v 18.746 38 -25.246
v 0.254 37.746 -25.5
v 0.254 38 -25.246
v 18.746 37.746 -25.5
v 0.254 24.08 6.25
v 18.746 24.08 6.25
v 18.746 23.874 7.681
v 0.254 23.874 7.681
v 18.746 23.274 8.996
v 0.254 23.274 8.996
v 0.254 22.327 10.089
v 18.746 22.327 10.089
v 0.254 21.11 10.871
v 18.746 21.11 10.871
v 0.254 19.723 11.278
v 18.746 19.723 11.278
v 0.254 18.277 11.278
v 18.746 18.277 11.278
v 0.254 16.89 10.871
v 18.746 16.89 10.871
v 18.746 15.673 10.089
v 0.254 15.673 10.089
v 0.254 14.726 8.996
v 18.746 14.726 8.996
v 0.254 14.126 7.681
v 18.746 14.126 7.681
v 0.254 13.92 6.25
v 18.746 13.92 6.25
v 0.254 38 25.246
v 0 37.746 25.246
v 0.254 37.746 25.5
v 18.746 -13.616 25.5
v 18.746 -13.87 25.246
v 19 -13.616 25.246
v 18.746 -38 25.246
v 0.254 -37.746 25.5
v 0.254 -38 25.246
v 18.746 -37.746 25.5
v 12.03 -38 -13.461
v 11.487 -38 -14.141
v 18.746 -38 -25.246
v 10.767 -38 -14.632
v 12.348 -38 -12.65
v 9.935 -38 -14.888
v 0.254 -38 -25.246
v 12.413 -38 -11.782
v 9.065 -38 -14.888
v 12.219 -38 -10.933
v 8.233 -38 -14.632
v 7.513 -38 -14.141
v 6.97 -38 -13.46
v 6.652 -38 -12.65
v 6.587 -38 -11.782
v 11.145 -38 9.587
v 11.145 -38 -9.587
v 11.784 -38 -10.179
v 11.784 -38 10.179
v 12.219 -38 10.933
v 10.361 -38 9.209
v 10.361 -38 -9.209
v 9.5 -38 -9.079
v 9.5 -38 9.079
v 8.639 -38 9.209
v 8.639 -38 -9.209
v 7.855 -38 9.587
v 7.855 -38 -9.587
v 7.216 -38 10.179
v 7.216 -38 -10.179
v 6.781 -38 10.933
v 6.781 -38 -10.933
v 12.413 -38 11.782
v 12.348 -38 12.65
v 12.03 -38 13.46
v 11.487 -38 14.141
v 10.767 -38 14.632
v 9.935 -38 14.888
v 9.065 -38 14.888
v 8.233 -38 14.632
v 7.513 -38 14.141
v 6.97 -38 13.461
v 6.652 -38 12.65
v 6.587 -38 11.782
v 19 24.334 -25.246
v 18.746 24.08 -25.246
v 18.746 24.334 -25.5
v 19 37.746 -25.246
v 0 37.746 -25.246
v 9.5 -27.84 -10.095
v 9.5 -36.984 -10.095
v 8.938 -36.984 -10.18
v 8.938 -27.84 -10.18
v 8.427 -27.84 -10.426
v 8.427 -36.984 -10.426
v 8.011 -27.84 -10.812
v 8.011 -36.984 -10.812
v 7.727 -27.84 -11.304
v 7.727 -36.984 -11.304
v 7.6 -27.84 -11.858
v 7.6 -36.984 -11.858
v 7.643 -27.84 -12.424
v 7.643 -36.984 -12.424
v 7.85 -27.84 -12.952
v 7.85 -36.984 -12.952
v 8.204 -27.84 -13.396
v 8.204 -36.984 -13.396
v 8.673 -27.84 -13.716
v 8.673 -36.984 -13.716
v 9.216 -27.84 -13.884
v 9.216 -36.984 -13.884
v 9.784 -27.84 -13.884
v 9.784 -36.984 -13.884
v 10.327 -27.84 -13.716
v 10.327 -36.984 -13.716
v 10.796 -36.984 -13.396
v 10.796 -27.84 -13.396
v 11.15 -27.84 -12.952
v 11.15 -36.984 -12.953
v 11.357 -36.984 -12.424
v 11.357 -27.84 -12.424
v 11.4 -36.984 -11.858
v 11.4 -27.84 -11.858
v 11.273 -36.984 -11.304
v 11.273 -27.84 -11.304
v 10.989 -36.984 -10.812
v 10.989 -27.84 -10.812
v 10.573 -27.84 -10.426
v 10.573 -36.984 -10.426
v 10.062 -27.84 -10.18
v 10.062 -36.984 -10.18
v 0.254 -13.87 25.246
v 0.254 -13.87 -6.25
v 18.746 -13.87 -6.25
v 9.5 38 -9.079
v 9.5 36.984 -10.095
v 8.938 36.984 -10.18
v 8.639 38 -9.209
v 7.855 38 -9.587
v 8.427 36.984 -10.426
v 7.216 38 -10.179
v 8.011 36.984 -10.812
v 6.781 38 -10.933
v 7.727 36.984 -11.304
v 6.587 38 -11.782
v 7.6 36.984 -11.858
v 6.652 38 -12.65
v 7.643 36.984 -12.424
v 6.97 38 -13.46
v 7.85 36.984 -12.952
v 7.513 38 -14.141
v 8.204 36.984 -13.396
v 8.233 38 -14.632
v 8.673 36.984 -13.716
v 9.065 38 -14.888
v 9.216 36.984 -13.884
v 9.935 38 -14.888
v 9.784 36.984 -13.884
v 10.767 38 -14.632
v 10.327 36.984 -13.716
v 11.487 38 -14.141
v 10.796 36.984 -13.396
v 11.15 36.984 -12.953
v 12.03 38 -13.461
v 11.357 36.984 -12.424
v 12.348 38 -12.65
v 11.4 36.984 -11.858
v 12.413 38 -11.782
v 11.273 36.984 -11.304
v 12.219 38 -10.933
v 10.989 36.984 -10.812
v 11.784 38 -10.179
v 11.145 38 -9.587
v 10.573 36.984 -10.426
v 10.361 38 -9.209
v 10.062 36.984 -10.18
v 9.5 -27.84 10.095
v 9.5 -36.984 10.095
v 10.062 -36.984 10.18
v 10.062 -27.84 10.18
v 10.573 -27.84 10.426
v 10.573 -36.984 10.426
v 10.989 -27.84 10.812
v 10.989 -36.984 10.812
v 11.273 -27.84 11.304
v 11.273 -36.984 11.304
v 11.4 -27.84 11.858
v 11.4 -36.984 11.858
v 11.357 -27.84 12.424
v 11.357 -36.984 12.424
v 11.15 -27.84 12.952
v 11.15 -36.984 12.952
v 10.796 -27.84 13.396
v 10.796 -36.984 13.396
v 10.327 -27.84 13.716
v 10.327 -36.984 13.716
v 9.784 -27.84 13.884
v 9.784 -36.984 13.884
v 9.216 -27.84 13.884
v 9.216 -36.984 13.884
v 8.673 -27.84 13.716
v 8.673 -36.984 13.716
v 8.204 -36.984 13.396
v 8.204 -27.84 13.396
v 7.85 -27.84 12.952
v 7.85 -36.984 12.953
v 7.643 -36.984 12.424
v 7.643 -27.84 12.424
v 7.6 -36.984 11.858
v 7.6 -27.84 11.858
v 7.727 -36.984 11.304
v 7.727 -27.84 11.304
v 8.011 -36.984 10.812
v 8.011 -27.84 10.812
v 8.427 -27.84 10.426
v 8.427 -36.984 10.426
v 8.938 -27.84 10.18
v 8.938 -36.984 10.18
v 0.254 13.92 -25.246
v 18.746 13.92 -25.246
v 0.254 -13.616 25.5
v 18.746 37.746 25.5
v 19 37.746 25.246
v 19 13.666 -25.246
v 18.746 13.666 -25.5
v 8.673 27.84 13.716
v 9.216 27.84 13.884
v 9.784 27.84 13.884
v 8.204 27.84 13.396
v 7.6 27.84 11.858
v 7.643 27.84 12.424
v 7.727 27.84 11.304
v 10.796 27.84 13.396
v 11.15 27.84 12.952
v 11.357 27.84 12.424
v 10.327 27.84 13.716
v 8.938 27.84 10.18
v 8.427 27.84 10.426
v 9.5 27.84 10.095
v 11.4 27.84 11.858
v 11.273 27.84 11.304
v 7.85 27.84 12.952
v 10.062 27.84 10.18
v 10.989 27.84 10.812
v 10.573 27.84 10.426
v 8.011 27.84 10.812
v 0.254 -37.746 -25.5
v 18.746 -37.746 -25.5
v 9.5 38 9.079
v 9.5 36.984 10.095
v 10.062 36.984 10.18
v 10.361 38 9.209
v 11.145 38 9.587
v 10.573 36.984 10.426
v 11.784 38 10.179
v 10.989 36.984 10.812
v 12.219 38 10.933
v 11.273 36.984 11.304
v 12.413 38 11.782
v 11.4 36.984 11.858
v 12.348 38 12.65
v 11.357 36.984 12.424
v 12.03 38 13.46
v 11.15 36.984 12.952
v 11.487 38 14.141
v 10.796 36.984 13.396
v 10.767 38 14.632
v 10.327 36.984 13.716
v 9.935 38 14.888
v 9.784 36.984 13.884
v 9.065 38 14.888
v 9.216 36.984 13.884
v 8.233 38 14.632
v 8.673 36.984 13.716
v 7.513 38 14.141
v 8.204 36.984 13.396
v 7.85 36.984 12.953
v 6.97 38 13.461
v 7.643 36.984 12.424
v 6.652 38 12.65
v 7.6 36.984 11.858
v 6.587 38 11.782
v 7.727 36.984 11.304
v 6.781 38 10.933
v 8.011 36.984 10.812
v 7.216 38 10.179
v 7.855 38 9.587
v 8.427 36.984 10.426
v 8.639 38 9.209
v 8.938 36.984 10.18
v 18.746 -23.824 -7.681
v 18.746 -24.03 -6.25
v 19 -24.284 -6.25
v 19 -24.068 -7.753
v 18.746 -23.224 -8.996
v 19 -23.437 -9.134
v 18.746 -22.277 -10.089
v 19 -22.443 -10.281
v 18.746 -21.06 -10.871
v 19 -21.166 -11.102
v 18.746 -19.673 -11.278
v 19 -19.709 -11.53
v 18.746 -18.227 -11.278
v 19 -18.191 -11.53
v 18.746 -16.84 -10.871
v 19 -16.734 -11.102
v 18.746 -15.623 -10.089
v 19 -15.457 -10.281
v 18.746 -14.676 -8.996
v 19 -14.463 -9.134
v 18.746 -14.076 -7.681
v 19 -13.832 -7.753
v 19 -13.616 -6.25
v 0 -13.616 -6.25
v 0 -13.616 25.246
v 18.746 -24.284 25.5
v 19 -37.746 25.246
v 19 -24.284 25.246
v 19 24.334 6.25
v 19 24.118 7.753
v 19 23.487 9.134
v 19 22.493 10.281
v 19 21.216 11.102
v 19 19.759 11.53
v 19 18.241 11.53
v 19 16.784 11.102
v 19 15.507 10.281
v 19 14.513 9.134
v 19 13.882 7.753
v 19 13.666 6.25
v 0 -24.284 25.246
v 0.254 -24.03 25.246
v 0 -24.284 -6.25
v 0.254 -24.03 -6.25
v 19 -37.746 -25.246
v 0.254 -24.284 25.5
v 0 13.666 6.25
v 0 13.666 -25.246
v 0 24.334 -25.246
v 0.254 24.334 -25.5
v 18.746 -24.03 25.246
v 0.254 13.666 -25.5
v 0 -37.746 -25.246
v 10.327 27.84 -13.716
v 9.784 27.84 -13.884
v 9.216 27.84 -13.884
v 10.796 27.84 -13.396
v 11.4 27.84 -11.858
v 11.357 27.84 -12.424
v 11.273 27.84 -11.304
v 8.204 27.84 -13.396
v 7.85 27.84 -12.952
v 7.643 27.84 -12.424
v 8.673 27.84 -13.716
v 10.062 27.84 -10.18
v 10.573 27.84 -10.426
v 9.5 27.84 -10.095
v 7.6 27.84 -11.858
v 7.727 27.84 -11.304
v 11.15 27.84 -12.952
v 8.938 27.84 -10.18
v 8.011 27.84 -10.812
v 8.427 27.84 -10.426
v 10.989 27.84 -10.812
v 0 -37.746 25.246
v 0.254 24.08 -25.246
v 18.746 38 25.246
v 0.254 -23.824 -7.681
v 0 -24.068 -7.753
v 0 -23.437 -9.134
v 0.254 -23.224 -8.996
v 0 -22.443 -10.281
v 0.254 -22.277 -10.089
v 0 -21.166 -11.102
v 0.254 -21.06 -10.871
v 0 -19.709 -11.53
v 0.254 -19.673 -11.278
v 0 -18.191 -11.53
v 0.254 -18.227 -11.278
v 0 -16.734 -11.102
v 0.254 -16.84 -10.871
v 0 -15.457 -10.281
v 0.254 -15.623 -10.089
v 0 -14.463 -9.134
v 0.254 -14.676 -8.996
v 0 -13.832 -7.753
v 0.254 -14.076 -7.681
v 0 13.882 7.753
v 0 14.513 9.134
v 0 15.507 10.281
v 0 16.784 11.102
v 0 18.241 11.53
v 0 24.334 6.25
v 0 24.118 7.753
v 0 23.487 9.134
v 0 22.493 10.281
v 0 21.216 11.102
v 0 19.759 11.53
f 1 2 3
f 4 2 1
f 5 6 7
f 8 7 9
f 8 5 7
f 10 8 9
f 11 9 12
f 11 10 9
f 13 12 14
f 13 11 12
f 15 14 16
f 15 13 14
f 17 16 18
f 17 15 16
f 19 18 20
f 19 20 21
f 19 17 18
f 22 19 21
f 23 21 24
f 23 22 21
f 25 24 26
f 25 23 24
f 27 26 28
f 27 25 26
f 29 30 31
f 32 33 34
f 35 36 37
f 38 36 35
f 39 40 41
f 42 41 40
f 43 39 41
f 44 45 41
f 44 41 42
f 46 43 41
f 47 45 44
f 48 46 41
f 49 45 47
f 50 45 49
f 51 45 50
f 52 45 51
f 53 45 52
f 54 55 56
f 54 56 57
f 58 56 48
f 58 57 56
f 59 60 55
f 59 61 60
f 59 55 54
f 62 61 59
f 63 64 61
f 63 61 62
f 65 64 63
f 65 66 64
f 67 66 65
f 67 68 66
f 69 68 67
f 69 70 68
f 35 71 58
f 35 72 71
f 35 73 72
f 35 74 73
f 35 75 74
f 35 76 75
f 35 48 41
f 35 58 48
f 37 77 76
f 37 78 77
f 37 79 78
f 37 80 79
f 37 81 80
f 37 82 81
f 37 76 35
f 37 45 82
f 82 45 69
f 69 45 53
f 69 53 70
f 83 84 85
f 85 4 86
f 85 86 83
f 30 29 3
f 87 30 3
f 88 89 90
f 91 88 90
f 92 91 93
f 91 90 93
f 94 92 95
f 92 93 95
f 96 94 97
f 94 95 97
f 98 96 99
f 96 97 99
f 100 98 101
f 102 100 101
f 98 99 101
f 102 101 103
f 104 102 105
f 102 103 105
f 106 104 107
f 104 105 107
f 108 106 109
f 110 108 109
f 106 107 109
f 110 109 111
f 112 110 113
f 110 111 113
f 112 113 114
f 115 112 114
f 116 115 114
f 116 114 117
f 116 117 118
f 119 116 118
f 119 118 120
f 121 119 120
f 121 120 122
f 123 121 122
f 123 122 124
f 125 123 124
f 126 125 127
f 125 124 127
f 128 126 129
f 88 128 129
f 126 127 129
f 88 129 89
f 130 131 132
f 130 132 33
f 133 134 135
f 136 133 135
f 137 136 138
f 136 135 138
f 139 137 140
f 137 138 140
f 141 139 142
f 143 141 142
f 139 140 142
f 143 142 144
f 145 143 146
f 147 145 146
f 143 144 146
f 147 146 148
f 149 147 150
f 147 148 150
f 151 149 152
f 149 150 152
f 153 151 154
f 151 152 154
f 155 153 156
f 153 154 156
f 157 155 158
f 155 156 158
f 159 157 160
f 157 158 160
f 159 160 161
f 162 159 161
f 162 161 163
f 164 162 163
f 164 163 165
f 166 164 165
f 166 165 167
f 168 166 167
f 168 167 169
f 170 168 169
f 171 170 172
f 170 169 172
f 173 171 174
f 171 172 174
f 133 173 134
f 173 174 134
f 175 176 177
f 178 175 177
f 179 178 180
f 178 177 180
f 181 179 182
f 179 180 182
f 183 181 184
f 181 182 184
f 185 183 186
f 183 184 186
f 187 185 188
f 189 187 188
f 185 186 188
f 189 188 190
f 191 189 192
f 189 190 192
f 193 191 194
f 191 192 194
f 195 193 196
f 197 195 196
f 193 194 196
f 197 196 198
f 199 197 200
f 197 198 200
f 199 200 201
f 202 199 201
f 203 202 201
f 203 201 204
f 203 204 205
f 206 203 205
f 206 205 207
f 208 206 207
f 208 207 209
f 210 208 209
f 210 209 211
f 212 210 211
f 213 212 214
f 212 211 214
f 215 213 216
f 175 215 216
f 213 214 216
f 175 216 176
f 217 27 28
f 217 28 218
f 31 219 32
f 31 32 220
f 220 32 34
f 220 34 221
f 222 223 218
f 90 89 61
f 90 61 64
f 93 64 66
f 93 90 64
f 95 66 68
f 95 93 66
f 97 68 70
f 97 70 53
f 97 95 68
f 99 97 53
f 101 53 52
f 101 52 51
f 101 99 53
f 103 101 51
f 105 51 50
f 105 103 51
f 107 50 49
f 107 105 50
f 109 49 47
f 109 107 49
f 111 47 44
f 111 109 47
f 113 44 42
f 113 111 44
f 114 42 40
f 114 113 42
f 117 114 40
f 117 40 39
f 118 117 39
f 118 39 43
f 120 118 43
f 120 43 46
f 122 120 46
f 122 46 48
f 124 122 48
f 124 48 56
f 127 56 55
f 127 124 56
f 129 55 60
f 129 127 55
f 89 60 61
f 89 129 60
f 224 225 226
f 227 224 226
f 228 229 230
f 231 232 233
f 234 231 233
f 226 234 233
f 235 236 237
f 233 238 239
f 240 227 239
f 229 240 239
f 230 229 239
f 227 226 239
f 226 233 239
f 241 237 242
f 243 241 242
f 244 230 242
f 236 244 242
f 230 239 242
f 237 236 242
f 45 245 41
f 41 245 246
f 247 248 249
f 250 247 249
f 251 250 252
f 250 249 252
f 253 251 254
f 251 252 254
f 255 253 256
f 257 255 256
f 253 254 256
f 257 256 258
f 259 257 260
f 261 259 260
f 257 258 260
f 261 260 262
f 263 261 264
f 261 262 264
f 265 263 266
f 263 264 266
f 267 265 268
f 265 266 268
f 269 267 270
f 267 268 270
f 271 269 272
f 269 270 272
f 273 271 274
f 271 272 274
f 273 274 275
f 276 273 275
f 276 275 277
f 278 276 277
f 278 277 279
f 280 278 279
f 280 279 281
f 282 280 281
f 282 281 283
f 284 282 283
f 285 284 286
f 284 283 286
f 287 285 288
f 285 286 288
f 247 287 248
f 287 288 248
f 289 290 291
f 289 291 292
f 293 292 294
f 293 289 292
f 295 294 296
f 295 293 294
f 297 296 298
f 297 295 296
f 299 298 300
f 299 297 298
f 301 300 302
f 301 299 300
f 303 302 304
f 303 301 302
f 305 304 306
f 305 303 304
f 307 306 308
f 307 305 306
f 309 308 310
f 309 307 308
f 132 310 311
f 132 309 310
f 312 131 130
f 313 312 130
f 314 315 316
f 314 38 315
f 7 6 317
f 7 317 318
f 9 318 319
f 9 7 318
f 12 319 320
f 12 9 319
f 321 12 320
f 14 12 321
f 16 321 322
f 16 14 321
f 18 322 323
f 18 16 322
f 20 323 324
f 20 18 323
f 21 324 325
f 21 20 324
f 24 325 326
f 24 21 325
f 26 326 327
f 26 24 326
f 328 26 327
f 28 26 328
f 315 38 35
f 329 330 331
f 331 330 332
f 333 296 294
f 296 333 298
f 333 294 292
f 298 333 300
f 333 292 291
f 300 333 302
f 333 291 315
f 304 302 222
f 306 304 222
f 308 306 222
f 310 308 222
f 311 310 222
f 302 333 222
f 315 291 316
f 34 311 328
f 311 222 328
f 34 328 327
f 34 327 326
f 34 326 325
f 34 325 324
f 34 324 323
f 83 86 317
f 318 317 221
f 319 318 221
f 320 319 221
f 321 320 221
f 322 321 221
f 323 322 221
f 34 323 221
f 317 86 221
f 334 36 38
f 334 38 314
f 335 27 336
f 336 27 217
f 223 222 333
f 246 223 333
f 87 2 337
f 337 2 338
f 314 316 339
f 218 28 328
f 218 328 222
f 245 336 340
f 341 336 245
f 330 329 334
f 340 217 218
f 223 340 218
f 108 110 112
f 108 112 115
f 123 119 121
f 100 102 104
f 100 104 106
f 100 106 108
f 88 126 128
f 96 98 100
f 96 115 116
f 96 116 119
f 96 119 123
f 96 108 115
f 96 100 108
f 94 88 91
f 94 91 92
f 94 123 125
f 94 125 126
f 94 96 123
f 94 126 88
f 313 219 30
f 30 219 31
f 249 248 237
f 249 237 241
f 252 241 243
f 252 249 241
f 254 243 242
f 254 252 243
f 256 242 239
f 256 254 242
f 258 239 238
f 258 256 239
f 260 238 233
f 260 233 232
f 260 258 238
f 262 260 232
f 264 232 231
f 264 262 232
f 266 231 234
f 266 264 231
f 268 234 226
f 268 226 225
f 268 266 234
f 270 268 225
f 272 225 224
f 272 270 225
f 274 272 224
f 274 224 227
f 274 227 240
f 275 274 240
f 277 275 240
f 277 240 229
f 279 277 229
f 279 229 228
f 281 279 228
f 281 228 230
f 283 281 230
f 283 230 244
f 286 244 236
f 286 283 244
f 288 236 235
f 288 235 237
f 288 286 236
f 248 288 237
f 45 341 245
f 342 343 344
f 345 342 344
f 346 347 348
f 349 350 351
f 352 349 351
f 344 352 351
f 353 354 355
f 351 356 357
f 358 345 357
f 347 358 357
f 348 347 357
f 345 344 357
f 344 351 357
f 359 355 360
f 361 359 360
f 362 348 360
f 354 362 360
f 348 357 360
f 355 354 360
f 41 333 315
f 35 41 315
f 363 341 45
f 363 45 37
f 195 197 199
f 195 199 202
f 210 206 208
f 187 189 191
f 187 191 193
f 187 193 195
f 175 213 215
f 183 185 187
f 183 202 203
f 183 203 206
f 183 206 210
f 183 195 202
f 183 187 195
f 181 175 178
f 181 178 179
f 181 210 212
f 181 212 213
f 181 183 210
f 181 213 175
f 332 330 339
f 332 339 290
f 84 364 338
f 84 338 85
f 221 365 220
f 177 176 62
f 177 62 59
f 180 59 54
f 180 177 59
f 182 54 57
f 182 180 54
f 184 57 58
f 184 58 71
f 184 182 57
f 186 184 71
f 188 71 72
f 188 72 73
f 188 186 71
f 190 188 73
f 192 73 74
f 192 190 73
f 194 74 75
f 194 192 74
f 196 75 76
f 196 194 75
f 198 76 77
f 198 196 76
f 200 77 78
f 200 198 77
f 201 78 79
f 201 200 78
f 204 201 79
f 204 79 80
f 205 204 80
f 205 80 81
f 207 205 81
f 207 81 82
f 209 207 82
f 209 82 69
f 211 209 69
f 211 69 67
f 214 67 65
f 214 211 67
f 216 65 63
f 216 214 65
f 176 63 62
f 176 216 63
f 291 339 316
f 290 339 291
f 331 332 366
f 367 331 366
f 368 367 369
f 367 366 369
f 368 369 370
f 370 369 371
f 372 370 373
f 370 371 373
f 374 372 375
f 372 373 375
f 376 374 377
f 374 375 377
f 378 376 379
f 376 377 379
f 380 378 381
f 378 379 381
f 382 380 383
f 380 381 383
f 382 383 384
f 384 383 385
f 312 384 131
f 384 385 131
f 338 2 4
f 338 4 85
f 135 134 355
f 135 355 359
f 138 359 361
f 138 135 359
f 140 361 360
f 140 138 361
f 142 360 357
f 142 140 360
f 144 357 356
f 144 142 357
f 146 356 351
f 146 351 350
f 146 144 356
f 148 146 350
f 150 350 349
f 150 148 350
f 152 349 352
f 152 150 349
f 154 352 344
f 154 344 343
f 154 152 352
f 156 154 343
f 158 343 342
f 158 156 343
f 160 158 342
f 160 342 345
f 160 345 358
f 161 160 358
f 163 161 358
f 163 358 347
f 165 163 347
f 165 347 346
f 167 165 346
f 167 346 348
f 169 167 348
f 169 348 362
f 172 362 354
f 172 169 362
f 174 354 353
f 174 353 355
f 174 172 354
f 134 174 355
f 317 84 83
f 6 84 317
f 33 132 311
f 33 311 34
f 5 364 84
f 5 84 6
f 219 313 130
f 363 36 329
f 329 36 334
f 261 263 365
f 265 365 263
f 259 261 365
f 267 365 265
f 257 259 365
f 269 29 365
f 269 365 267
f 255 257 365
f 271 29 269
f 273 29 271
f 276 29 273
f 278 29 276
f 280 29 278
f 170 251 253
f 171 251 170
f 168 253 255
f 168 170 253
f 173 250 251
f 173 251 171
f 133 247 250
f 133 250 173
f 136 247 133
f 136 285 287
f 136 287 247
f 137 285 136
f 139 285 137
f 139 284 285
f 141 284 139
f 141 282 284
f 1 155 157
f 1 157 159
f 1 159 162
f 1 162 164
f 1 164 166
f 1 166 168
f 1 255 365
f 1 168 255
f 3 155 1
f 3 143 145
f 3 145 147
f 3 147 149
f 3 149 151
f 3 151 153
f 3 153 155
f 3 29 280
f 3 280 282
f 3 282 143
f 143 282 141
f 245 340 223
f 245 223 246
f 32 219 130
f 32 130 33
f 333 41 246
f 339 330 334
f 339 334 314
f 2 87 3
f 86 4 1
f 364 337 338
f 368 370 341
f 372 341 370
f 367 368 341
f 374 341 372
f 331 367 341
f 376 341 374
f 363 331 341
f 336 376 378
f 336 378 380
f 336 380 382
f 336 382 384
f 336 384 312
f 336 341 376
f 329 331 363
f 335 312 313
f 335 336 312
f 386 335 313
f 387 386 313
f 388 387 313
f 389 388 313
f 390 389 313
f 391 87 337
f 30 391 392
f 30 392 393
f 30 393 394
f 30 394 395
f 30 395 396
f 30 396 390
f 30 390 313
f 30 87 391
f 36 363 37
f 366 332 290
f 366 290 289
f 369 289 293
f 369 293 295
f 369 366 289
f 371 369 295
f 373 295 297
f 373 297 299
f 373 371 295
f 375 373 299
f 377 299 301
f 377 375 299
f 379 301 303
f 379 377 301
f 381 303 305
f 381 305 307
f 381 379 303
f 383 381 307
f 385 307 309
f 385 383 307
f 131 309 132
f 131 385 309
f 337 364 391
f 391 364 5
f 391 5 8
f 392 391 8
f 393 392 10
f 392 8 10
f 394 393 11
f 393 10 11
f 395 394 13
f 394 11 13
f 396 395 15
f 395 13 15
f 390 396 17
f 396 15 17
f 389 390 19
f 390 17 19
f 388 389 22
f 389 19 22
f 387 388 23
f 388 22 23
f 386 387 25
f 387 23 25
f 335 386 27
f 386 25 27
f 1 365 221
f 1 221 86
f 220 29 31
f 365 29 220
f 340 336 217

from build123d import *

# Parameters (mm, degrees)
BOSS_EXTRUDE1_DEPTH = 19
SKETCH2_R           = 1.905
CUT_EXTRUDE1_DEPTH  = 10.16
CHAMFER1_SIZE       = 1.016
CHAMFER2_SIZE       = 0.254
CHAMFER3_SIZE       = 1.016


with BuildPart() as part:
    # Sketch1 → Boss-Extrude1 (new body)
    with BuildSketch(Plane(origin=(0, 0, 0), x_dir=(0, 0, -1), z_dir=(1, 0, 0))):
        with BuildLine():
            Line((6.25, -13.87), (-25.5, -13.87))
            Line((-25.5, -13.87), (-25.5, 38))
            Line((-25.5, 38), (25.5, 38))
            Line((25.5, 38), (25.5, 24.08))
            Line((25.5, 24.08), (-6.25, 24.08))
            ThreePointArc((-6.25, 24.08), (-11.33, 19), (-6.25, 13.92))
            Line((-6.25, 13.92), (25.5, 13.92))
            Line((25.5, 13.92), (25.5, -38))
            Line((25.5, -38), (-25.5, -38))
            Line((-25.5, -38), (-25.5, -24.03))
            Line((-25.5, -24.03), (6.25, -24.03))
            ThreePointArc((6.25, -24.03), (11.33, -18.95), (6.25, -13.87))
        make_face()
    extrude(amount=BOSS_EXTRUDE1_DEPTH)

    # Sketch2 → Cut-Extrude1 (cut)
    with BuildSketch(Plane.XZ.offset(38)):
        with Locations(Location((9.5, 12, 0), (0, 0, 270))):
            Circle(SKETCH2_R)
        with Locations(Location((9.5, -12, 0), (0, 0, 90))):
            Circle(SKETCH2_R)
    cut_extrude1 = extrude(amount=-CUT_EXTRUDE1_DEPTH, mode=Mode.SUBTRACT)

    # Chamfer1
    chamfer1_edges = [part.edges().sort_by_distance(p)[0] for p in [
        (9.5, -38, 13.905),
        (9.5, -38, -13.905),
    ]]
    chamfer(chamfer1_edges, length=CHAMFER1_SIZE)

    # Chamfer2
    chamfer2_edges = [part.edges().sort_by_distance(p)[0] for p in [
        (19, -18.95, -11.33),
        (0, 12.065, 25.5),
        (0, 38, 0),
        (0, 31.04, -25.5),
        (0, 24.08, -9.625),
        (19, -24.03, 9.625),
        (0, 19, 11.33),
        (0, 13.92, -9.625),
        (0, -12.04, -25.5),
        (0, -38, 0),
        (0, -31.015, 25.5),
        (0, -24.03, 9.625),
        (0, -18.95, -11.33),
        (0, -13.87, 9.625),
        (19, -31.015, 25.5),
        (9.5, -13.87, 25.5),
        (9.5, 38, 25.5),
        (9.5, 38, -25.5),
        (9.5, 24.08, -25.5),
        (9.5, 13.92, -25.5),
        (9.5, -38, -25.5),
        (9.5, -38, 25.5),
        (9.5, -24.03, 25.5),
        (19, -38, 0),
        (19, -12.04, -25.5),
        (19, 13.92, -9.625),
        (19, 19, 11.33),
        (19, 24.08, -9.625),
        (19, 31.04, -25.5),
        (19, 38, 0),
        (19, -13.87, 9.625),
        (19, 12.065, 25.5),
    ]]
    chamfer(chamfer2_edges, length=CHAMFER2_SIZE)

    # Mirror3: Cut-Extrude1 across plane
    add(cut_extrude1.mirror(Plane.ZX), mode=Mode.SUBTRACT)

    # Chamfer3
    chamfer3_edges = [part.edges().sort_by_distance(p)[0] for p in [
        (9.5, 38, 13.905),
        (9.5, 38, -13.905),
    ]]
    chamfer(chamfer3_edges, length=CHAMFER3_SIZE)


solid = part.part
